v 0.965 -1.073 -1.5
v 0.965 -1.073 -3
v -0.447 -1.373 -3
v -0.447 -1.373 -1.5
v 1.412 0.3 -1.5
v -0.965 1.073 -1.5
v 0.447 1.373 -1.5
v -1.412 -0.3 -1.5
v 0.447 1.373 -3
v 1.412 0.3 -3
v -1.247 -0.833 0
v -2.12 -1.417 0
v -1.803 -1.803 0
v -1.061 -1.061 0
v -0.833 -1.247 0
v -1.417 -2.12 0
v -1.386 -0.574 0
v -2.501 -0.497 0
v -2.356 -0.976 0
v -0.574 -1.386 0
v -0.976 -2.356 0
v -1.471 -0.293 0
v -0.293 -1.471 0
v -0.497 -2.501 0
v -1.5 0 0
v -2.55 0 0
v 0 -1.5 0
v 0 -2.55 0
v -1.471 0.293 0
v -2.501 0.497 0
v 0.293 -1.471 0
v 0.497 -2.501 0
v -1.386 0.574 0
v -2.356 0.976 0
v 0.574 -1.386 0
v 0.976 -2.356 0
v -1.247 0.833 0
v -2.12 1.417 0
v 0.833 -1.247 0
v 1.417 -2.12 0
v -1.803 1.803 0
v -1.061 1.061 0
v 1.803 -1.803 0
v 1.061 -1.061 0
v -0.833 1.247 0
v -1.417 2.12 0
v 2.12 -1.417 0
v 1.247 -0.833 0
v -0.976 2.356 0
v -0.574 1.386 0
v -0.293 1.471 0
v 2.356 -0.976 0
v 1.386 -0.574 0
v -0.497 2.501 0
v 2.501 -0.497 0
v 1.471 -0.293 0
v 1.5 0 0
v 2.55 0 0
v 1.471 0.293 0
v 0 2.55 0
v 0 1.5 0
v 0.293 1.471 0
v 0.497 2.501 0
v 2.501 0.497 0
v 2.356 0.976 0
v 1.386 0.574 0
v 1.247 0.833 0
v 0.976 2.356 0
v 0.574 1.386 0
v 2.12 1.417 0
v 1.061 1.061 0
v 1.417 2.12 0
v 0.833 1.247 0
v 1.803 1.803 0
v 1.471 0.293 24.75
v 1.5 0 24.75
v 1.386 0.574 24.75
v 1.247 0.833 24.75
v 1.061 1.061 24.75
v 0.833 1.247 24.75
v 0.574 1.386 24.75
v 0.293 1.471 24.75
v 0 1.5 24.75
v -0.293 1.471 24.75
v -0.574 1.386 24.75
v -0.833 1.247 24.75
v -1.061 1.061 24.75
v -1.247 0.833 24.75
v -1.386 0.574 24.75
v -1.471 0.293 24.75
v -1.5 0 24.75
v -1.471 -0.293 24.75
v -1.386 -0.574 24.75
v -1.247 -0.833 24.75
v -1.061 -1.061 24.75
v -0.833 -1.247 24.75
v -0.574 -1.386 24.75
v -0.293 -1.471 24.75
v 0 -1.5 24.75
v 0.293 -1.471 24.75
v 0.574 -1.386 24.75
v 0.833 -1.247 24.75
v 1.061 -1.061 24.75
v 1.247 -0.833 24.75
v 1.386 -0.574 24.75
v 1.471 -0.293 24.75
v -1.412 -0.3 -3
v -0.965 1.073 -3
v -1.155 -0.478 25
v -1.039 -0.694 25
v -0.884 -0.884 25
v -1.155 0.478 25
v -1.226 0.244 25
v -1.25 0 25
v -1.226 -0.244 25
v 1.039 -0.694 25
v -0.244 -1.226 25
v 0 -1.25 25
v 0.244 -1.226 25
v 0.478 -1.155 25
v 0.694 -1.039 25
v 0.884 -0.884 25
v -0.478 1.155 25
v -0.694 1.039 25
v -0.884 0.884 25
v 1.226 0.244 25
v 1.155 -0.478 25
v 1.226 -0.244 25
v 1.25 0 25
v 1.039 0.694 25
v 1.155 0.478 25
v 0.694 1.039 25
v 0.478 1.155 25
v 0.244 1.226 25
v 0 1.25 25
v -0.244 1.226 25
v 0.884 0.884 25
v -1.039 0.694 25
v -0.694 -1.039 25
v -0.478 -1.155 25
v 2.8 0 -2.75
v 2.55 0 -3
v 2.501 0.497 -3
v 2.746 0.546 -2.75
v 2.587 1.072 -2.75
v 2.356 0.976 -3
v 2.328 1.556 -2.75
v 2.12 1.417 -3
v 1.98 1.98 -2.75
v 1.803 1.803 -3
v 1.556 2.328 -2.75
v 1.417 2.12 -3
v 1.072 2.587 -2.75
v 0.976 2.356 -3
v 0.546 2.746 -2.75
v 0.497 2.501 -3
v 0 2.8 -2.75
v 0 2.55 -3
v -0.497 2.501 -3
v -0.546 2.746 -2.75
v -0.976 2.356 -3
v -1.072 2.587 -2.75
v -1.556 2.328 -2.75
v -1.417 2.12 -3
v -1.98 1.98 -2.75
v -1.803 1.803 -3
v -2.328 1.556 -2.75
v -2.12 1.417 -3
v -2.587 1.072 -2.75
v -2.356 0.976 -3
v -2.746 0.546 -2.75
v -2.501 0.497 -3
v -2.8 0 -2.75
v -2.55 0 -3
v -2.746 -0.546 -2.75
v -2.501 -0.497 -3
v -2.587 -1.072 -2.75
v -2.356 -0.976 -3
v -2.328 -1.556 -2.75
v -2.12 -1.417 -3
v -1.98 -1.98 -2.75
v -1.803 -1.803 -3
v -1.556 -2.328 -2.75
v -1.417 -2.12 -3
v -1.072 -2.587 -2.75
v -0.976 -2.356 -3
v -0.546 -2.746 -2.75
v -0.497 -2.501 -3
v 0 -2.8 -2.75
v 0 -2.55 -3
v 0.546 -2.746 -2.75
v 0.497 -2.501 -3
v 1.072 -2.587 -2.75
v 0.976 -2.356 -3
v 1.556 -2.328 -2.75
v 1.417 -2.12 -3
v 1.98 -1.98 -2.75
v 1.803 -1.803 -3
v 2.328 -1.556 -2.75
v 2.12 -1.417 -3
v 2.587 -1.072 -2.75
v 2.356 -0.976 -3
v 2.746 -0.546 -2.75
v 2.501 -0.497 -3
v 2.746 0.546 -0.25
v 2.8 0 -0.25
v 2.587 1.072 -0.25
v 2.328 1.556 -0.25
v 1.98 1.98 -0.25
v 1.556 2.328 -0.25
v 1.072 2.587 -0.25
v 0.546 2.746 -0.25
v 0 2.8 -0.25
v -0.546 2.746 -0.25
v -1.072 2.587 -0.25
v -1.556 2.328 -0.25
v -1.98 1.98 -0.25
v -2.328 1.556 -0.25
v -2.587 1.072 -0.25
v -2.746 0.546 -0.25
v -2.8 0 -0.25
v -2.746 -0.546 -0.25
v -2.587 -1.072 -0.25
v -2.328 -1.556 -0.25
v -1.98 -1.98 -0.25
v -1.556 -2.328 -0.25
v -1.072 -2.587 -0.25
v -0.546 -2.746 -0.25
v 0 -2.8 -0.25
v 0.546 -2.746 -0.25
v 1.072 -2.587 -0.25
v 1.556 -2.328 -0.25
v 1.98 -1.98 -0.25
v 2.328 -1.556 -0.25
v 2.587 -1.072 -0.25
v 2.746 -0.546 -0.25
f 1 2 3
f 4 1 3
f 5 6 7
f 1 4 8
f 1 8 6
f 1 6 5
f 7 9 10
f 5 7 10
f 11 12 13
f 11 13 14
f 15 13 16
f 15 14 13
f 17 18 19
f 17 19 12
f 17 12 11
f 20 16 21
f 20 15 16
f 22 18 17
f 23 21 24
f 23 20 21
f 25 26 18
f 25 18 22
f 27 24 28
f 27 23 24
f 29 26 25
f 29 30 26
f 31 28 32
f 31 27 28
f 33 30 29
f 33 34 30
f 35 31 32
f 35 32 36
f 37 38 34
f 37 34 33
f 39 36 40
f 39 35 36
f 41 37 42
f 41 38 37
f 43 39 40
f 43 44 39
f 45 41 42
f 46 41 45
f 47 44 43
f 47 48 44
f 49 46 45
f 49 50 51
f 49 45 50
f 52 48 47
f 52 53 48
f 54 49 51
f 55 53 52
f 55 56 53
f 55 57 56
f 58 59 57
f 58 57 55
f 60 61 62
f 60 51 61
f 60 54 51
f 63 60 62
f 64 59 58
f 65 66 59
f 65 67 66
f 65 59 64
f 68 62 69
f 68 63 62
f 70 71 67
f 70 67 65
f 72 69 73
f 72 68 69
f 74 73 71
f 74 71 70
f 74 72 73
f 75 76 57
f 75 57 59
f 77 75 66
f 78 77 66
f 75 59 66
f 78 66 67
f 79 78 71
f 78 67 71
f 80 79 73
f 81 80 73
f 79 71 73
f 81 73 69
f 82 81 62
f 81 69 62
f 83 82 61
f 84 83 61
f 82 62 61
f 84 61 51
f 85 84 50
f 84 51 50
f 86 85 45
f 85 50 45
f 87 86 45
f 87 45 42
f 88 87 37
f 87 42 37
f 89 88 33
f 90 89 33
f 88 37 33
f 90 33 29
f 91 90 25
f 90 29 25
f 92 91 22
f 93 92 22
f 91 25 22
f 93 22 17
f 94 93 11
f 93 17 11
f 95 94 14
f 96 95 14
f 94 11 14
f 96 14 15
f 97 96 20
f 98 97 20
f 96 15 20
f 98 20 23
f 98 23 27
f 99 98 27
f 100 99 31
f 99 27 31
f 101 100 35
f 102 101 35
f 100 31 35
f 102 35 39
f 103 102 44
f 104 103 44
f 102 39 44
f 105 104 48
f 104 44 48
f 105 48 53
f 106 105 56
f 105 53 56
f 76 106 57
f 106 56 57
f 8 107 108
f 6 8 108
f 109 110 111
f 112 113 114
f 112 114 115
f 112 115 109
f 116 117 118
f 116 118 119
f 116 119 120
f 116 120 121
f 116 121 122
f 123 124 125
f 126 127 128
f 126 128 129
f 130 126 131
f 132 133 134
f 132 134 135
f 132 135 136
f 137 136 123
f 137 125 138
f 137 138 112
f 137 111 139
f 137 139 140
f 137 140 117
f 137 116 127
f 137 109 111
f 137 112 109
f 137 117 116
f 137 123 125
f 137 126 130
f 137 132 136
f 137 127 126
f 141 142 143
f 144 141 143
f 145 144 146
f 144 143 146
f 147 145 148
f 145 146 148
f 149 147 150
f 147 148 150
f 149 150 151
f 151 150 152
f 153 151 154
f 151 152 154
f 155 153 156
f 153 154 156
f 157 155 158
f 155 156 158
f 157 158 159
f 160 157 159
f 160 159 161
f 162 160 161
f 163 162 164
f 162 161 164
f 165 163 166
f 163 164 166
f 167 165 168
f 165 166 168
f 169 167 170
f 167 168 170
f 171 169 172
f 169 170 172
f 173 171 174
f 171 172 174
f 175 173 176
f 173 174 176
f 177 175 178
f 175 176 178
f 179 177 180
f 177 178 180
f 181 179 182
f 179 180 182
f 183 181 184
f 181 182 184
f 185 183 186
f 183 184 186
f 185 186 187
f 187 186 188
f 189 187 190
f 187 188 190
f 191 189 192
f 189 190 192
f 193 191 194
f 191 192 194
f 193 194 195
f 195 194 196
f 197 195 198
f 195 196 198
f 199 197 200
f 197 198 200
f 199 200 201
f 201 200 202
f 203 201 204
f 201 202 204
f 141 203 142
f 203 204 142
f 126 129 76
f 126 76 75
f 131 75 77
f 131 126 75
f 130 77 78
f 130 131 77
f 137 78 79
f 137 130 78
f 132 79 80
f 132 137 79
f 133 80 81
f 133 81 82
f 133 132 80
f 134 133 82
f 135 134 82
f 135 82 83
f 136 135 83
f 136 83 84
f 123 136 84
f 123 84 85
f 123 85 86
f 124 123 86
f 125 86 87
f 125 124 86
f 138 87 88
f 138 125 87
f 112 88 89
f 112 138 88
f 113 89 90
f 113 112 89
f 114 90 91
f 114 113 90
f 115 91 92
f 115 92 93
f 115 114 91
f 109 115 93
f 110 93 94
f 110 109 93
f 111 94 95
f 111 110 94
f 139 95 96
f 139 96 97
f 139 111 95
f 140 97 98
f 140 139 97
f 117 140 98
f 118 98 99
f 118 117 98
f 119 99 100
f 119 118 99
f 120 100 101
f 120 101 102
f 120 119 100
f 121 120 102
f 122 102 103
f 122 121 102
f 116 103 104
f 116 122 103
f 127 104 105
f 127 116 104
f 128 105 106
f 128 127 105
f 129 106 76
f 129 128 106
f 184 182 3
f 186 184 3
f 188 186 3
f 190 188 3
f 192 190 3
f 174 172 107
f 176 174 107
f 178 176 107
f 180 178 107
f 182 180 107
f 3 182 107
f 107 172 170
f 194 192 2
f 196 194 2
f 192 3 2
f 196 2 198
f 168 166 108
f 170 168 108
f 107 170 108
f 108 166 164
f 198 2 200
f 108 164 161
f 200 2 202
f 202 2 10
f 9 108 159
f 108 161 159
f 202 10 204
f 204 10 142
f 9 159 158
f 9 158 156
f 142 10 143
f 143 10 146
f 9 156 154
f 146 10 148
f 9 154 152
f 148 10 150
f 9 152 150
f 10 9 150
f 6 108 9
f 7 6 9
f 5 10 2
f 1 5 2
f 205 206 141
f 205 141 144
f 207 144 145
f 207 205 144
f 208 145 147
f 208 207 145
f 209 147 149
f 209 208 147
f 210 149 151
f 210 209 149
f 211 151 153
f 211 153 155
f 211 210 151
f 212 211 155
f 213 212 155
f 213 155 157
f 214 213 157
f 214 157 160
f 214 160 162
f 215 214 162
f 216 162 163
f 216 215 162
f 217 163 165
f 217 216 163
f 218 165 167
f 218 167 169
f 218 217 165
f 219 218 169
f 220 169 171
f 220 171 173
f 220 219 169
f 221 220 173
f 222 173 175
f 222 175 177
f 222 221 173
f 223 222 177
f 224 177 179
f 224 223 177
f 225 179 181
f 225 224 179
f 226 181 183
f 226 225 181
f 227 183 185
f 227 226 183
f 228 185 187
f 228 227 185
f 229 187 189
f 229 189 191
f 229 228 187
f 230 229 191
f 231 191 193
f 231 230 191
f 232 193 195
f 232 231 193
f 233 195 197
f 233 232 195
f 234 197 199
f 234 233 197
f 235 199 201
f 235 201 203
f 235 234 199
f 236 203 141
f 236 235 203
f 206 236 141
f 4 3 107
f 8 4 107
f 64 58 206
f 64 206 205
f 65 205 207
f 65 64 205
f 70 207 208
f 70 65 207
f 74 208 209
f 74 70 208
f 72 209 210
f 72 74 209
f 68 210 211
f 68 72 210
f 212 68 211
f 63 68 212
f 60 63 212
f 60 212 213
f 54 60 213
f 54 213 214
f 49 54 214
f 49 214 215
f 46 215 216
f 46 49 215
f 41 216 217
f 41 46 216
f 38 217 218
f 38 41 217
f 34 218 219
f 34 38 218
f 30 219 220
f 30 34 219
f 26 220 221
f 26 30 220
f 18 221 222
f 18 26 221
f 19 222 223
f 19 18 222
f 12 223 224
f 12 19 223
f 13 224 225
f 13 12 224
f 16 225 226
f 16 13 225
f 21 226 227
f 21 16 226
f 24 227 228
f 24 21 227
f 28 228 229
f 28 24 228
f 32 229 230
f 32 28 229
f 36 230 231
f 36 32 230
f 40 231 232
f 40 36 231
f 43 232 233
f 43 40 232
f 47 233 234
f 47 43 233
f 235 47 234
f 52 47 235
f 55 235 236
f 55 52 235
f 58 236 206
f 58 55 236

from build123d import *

# Parameters (mm, degrees)
F0_R     = 1.5
F1_DEPTH = 25
F2_R     = 2.8
F3_DEPTH = 3
F5_DEPTH = 1.5
F6_SIZE  = 0.25


with BuildPart() as f1:
    # F0 (on Top) → F1 (new body)
    with BuildSketch(Plane.XY):
        Circle(F0_R)
    extrude(amount=F1_DEPTH)

    # F2 (on Top) → F3 (join)
    with BuildSketch(Plane.XY):
        Circle(F2_R)
    extrude(amount=-F3_DEPTH)

    # F4 (on face) → F5 (cut)
    with BuildSketch(Plane(origin=(0, 0, -3), x_dir=(1, 0, 0), z_dir=(0, 0, -1))):
        Polygon((0.446582, -1.372552), (1.411956, -0.299524), (0.965373, 1.073027), (-0.446582, 1.372552), (-1.411956, 0.299524), (-0.965373, -1.073027), align=None)
    extrude(amount=-F5_DEPTH, mode=Mode.SUBTRACT)

    # F6
    f6_edges = [f1.edges().sort_by_distance(p)[0] for p in [
        (-2.8, 0, -3),
        (-1.5, 0, 25),
        (-2.8, 0, 0),
    ]]
    chamfer(f6_edges, length=F6_SIZE)


solid = f1.part
